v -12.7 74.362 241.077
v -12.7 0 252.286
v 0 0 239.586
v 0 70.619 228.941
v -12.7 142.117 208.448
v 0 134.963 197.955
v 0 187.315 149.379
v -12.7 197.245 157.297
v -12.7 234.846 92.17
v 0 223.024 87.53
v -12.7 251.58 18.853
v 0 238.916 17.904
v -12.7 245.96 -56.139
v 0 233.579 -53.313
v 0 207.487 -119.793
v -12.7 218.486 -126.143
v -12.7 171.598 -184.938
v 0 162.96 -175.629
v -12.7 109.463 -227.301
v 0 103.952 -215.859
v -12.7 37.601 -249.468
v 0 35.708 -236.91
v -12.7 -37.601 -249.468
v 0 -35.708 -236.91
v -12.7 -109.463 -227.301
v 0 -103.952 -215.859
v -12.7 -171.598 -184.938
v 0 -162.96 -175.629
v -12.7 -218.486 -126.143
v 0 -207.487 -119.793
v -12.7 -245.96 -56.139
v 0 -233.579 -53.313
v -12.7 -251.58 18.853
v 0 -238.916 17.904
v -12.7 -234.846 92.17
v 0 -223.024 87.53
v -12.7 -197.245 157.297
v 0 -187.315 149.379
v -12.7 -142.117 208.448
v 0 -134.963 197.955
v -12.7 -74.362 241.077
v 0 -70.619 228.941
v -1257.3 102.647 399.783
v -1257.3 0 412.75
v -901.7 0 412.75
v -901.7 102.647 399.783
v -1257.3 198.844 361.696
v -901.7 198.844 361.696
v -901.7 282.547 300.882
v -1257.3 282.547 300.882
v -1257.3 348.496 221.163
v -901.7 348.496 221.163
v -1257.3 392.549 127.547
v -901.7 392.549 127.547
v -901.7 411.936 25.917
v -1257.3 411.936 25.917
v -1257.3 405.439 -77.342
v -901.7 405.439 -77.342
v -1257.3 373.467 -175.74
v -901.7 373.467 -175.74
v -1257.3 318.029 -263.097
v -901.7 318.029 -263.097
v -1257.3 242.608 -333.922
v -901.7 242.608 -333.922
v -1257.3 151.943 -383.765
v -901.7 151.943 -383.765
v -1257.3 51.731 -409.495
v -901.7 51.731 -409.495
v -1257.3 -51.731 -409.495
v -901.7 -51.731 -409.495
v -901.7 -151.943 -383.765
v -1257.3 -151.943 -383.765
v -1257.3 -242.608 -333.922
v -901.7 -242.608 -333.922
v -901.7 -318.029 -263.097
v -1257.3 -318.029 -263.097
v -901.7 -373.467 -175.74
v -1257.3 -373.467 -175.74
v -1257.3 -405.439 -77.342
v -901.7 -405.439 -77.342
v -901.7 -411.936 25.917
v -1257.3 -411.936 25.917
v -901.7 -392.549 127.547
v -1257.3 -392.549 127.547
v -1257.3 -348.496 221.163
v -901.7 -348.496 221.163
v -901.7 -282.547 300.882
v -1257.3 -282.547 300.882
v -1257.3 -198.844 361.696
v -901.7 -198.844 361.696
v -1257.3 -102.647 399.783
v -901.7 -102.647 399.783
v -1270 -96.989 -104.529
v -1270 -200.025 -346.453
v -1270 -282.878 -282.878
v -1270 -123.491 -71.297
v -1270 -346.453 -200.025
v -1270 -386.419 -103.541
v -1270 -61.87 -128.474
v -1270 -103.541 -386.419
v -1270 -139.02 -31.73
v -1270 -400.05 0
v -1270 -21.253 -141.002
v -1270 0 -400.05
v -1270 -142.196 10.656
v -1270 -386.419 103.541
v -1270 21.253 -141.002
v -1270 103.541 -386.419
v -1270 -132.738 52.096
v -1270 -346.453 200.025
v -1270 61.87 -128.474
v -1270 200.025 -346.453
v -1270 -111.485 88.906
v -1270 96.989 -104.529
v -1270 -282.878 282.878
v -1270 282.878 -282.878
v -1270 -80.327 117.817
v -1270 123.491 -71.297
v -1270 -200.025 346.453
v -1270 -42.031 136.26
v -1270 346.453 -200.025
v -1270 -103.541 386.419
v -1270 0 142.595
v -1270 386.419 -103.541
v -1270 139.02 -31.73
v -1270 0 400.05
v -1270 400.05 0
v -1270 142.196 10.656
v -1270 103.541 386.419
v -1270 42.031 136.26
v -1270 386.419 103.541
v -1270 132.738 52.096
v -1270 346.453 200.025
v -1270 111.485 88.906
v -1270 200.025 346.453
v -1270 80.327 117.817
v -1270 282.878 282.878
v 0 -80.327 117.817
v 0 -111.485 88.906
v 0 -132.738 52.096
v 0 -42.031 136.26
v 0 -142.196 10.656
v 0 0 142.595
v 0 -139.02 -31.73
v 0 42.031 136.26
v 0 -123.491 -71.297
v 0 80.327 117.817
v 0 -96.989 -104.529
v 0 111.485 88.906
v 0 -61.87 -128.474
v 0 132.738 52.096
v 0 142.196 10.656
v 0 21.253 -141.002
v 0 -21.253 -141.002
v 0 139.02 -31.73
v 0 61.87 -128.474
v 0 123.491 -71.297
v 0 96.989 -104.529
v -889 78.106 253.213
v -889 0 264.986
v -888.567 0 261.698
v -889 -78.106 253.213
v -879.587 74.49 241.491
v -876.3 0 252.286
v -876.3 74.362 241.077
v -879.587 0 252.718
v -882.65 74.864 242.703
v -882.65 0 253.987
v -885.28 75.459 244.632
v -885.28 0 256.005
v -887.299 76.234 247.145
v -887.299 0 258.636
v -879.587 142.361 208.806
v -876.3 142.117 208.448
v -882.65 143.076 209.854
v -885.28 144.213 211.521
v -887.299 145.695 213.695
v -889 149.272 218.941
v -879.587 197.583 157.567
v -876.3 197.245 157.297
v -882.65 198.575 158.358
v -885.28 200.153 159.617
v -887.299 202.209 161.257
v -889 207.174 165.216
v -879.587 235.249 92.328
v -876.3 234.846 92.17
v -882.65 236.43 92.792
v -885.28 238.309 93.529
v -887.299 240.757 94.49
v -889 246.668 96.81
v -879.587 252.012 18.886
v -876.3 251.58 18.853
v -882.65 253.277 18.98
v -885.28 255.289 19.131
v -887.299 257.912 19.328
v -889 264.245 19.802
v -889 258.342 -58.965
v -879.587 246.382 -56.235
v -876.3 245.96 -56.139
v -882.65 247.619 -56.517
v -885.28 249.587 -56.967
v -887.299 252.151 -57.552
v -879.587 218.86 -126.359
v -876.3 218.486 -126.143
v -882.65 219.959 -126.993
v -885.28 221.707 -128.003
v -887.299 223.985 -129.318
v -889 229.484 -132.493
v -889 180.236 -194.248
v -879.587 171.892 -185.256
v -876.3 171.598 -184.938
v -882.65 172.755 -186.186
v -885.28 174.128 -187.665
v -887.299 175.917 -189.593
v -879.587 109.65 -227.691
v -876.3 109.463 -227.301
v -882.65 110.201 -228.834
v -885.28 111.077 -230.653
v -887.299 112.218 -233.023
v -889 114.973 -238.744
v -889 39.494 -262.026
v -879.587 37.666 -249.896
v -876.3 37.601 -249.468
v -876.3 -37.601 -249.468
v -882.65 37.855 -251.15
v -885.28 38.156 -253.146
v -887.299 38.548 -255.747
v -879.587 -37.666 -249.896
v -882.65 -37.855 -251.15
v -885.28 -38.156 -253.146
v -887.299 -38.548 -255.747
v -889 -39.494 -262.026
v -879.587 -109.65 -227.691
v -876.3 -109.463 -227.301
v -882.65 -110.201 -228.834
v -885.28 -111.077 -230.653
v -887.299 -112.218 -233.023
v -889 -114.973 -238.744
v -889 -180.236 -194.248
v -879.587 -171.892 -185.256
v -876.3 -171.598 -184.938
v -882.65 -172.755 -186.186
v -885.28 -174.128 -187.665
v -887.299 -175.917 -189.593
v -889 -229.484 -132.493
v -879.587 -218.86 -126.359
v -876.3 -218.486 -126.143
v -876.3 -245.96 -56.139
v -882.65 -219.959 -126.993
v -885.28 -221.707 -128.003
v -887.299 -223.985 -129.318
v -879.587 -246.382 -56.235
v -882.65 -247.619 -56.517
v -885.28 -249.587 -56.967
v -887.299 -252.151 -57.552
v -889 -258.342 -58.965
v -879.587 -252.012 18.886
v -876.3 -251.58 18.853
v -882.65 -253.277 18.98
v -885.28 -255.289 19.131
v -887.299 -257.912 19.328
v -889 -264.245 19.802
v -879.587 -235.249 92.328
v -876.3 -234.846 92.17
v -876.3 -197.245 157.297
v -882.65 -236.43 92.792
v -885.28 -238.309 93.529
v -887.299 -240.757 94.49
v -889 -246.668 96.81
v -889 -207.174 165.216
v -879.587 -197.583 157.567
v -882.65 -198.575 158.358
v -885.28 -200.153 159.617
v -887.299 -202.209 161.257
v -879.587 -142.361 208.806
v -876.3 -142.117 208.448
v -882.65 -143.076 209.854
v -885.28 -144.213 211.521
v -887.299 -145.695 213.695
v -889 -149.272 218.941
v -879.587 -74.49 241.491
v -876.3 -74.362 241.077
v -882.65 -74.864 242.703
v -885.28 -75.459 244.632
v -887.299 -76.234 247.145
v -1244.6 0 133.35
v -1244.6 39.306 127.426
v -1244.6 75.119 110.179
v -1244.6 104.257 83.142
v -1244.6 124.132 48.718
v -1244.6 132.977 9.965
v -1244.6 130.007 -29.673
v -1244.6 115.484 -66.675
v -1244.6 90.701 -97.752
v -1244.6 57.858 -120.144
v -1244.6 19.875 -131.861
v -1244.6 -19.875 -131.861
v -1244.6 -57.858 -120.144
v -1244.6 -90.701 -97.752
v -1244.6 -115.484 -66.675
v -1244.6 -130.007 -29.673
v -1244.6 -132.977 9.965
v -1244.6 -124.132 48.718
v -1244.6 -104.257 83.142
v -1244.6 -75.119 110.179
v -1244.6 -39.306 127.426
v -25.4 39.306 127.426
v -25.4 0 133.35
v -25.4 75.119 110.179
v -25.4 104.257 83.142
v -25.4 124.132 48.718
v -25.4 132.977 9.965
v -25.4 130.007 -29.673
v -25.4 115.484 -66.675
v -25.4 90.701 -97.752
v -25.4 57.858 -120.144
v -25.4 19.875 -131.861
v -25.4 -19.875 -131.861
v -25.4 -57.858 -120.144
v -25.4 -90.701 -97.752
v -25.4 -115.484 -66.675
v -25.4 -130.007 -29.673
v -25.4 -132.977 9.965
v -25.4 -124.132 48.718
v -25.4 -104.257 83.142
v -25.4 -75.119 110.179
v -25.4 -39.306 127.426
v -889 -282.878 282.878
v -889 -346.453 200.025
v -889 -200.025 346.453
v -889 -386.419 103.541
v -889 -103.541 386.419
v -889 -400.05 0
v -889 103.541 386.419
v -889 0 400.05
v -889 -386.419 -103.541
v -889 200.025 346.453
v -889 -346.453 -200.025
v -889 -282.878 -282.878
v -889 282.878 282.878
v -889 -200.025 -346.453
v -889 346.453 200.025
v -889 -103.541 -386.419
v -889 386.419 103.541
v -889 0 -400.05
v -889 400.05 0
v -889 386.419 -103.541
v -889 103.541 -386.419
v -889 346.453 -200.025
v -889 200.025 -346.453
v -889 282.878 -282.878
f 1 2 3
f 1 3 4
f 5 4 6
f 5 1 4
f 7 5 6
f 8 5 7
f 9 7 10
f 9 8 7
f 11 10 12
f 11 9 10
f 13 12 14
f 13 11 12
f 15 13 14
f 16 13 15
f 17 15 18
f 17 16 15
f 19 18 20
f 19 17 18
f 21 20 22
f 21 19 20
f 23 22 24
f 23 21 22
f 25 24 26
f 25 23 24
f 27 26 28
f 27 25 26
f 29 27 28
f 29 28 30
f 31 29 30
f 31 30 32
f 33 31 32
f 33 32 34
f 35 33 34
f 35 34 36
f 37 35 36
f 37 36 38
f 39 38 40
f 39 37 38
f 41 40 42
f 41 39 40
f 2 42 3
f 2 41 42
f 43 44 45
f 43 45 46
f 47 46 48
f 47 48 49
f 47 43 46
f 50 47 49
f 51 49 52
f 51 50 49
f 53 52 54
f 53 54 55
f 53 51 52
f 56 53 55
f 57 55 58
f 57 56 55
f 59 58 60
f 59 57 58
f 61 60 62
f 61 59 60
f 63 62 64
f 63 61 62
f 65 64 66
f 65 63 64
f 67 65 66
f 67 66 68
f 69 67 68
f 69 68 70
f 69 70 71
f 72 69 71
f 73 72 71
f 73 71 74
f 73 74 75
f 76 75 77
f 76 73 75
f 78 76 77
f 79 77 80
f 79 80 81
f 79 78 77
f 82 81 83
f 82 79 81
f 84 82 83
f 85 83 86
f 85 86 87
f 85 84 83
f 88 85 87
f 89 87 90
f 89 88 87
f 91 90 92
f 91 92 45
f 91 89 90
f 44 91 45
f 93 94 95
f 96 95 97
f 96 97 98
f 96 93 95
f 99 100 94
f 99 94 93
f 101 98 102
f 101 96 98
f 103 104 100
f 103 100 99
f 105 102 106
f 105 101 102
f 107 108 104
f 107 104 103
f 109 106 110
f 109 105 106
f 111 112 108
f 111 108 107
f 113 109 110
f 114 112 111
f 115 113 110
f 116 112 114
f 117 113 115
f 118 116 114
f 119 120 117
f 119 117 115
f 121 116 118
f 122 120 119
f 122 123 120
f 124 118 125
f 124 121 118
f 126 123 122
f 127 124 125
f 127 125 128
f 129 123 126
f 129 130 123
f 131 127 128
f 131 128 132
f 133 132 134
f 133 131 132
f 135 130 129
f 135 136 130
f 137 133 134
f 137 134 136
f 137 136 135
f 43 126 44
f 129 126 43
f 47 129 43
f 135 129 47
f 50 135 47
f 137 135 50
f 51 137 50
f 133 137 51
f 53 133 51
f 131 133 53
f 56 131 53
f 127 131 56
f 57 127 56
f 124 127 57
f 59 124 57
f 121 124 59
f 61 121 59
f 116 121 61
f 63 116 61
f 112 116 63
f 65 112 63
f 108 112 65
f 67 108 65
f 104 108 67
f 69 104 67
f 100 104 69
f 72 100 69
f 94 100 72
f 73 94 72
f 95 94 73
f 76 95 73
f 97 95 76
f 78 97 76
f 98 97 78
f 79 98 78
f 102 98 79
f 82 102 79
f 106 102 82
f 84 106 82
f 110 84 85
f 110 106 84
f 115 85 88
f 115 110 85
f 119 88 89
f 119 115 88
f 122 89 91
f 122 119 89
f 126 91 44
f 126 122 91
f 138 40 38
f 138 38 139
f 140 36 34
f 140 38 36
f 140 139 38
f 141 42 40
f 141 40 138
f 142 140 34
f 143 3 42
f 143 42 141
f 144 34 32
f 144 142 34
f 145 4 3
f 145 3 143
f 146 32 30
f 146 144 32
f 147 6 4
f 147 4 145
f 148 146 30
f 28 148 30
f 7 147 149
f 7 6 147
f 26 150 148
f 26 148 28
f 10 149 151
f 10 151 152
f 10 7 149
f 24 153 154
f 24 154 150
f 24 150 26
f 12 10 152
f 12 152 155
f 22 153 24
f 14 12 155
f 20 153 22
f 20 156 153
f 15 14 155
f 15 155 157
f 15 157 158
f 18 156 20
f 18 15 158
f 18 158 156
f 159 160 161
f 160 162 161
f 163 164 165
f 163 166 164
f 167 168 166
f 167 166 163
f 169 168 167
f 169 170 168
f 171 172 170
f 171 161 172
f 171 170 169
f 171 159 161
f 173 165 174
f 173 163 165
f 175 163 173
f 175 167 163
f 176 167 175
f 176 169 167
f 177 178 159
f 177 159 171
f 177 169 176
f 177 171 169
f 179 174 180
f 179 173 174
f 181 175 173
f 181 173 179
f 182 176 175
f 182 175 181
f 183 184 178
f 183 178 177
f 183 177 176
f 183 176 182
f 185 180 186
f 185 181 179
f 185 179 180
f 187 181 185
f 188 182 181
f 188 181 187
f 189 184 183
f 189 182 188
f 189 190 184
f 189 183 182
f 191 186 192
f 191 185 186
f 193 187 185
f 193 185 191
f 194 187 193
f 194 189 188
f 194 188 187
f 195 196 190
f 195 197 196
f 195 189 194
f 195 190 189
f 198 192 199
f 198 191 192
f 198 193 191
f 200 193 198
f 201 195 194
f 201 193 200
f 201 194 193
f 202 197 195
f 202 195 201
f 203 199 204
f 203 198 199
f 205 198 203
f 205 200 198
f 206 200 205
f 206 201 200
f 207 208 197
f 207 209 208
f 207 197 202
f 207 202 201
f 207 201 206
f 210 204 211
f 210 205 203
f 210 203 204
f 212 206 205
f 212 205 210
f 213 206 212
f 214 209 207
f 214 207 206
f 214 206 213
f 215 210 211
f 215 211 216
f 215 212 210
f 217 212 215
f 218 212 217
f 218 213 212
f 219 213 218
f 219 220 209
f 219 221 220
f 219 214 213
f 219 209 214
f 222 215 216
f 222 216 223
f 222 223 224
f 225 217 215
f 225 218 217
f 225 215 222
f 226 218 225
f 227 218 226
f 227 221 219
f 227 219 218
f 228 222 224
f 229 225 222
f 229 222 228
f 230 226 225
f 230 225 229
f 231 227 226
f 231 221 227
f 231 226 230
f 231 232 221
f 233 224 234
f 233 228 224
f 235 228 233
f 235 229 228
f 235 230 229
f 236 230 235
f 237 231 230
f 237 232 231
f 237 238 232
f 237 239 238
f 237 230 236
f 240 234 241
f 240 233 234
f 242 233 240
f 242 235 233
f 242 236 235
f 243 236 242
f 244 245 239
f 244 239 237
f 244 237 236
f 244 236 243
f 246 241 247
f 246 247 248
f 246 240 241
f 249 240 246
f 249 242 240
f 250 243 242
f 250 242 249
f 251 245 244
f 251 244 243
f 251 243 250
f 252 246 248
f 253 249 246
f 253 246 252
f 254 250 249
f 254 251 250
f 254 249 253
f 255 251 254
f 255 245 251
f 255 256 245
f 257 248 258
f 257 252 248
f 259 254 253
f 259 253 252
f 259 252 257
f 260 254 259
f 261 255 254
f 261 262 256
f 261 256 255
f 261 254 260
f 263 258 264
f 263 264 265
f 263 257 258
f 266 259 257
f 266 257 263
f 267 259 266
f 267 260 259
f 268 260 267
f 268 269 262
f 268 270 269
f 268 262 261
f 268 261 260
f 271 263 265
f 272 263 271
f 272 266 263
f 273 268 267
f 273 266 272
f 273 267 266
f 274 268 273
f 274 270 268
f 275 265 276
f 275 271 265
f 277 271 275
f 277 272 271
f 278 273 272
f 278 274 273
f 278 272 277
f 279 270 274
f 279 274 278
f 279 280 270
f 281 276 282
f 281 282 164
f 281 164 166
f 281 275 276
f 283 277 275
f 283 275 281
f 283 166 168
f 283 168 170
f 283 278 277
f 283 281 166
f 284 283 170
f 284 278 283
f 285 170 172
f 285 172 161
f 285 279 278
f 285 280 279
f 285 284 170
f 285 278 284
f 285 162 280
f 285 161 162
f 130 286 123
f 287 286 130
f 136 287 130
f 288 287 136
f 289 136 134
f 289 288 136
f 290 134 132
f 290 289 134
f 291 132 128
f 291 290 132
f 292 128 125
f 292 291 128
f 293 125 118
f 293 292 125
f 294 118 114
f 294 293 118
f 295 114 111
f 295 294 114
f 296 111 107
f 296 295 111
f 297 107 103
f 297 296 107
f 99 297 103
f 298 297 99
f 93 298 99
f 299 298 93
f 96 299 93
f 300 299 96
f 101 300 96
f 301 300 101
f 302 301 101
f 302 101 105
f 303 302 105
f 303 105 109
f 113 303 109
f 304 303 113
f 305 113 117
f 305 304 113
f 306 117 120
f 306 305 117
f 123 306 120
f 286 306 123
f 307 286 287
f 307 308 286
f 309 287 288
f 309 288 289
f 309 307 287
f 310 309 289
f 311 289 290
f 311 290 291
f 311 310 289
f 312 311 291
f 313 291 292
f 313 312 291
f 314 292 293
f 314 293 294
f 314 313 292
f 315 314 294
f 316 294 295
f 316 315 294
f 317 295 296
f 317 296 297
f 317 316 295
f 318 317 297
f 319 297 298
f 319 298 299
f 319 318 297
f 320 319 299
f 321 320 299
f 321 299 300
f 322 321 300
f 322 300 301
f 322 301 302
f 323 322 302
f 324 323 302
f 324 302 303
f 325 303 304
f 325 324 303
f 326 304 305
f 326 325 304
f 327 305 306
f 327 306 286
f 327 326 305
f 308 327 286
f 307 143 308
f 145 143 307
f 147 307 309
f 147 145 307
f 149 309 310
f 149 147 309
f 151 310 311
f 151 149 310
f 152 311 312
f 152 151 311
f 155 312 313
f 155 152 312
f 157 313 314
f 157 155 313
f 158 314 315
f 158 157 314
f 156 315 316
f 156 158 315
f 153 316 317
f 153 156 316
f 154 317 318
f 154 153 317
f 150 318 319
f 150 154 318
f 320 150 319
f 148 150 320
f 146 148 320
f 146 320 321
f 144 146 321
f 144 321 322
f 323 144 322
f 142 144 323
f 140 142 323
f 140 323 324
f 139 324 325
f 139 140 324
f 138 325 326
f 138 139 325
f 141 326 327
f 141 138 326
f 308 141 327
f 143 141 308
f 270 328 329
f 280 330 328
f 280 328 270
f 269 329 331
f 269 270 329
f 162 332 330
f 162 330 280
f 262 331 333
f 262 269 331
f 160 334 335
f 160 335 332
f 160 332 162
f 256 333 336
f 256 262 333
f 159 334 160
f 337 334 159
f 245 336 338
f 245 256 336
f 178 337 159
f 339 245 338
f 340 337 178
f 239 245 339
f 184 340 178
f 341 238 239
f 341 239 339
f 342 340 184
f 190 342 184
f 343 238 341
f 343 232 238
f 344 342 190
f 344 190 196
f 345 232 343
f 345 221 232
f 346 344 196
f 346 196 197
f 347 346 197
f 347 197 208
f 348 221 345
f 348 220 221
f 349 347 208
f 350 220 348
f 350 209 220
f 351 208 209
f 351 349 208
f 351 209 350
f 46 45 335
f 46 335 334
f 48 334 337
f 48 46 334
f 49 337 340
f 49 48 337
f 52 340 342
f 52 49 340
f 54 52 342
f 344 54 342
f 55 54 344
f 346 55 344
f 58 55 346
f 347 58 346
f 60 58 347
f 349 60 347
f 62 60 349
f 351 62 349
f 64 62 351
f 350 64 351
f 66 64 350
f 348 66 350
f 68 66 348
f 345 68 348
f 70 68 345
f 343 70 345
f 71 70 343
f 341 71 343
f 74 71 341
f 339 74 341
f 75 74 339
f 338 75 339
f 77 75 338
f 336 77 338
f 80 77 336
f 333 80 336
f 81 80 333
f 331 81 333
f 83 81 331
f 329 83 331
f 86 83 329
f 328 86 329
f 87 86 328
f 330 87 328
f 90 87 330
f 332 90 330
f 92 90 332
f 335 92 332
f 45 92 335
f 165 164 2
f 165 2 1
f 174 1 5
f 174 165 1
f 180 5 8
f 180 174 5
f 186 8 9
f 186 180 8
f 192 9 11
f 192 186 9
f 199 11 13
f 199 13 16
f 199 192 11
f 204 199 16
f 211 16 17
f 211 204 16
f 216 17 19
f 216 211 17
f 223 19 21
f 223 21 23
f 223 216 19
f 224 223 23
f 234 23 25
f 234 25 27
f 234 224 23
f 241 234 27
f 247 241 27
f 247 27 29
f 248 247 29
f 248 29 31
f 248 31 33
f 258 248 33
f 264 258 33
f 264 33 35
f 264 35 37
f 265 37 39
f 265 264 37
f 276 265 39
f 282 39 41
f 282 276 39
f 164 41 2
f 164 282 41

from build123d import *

# Parameters (mm, degrees)
F2_SIZE = 12.7


with BuildPart() as f1:
    # F0 (on Front) → F1 (revolve)
    with BuildSketch(Plane.XZ):
        with BuildLine():
            Line((-25.4, 133.35), (0, 142.594844))
            Line((0, 142.594844), (0, 252.2855))
            Line((0, 252.2855), (-876.3, 252.2855))
            ThreePointArc((-876.3, 252.2855), (-885.280256, 256.005244), (-889, 264.9855))
            Line((-889, 264.9855), (-889, 412.75))
            Line((-889, 412.75), (-1270, 412.75))
            Line((-1270, 412.75), (-1270, 142.594844))
            Line((-1270, 142.594844), (-1244.6, 133.35))
            Line((-1244.6, 133.35), (-25.4, 133.35))
        make_face()
    revolve(axis=Axis((-190.5, 0, 0), (-1, 0, 0)))

    # F2
    f2_edges = [f1.edges().sort_by_distance(p)[0] for p in [
        (0, 0, -252.2855),
        (-889, 0, -412.75),
        (-1270, 0, -412.75),
    ]]
    chamfer(f2_edges, length=F2_SIZE)


solid = f1.part
